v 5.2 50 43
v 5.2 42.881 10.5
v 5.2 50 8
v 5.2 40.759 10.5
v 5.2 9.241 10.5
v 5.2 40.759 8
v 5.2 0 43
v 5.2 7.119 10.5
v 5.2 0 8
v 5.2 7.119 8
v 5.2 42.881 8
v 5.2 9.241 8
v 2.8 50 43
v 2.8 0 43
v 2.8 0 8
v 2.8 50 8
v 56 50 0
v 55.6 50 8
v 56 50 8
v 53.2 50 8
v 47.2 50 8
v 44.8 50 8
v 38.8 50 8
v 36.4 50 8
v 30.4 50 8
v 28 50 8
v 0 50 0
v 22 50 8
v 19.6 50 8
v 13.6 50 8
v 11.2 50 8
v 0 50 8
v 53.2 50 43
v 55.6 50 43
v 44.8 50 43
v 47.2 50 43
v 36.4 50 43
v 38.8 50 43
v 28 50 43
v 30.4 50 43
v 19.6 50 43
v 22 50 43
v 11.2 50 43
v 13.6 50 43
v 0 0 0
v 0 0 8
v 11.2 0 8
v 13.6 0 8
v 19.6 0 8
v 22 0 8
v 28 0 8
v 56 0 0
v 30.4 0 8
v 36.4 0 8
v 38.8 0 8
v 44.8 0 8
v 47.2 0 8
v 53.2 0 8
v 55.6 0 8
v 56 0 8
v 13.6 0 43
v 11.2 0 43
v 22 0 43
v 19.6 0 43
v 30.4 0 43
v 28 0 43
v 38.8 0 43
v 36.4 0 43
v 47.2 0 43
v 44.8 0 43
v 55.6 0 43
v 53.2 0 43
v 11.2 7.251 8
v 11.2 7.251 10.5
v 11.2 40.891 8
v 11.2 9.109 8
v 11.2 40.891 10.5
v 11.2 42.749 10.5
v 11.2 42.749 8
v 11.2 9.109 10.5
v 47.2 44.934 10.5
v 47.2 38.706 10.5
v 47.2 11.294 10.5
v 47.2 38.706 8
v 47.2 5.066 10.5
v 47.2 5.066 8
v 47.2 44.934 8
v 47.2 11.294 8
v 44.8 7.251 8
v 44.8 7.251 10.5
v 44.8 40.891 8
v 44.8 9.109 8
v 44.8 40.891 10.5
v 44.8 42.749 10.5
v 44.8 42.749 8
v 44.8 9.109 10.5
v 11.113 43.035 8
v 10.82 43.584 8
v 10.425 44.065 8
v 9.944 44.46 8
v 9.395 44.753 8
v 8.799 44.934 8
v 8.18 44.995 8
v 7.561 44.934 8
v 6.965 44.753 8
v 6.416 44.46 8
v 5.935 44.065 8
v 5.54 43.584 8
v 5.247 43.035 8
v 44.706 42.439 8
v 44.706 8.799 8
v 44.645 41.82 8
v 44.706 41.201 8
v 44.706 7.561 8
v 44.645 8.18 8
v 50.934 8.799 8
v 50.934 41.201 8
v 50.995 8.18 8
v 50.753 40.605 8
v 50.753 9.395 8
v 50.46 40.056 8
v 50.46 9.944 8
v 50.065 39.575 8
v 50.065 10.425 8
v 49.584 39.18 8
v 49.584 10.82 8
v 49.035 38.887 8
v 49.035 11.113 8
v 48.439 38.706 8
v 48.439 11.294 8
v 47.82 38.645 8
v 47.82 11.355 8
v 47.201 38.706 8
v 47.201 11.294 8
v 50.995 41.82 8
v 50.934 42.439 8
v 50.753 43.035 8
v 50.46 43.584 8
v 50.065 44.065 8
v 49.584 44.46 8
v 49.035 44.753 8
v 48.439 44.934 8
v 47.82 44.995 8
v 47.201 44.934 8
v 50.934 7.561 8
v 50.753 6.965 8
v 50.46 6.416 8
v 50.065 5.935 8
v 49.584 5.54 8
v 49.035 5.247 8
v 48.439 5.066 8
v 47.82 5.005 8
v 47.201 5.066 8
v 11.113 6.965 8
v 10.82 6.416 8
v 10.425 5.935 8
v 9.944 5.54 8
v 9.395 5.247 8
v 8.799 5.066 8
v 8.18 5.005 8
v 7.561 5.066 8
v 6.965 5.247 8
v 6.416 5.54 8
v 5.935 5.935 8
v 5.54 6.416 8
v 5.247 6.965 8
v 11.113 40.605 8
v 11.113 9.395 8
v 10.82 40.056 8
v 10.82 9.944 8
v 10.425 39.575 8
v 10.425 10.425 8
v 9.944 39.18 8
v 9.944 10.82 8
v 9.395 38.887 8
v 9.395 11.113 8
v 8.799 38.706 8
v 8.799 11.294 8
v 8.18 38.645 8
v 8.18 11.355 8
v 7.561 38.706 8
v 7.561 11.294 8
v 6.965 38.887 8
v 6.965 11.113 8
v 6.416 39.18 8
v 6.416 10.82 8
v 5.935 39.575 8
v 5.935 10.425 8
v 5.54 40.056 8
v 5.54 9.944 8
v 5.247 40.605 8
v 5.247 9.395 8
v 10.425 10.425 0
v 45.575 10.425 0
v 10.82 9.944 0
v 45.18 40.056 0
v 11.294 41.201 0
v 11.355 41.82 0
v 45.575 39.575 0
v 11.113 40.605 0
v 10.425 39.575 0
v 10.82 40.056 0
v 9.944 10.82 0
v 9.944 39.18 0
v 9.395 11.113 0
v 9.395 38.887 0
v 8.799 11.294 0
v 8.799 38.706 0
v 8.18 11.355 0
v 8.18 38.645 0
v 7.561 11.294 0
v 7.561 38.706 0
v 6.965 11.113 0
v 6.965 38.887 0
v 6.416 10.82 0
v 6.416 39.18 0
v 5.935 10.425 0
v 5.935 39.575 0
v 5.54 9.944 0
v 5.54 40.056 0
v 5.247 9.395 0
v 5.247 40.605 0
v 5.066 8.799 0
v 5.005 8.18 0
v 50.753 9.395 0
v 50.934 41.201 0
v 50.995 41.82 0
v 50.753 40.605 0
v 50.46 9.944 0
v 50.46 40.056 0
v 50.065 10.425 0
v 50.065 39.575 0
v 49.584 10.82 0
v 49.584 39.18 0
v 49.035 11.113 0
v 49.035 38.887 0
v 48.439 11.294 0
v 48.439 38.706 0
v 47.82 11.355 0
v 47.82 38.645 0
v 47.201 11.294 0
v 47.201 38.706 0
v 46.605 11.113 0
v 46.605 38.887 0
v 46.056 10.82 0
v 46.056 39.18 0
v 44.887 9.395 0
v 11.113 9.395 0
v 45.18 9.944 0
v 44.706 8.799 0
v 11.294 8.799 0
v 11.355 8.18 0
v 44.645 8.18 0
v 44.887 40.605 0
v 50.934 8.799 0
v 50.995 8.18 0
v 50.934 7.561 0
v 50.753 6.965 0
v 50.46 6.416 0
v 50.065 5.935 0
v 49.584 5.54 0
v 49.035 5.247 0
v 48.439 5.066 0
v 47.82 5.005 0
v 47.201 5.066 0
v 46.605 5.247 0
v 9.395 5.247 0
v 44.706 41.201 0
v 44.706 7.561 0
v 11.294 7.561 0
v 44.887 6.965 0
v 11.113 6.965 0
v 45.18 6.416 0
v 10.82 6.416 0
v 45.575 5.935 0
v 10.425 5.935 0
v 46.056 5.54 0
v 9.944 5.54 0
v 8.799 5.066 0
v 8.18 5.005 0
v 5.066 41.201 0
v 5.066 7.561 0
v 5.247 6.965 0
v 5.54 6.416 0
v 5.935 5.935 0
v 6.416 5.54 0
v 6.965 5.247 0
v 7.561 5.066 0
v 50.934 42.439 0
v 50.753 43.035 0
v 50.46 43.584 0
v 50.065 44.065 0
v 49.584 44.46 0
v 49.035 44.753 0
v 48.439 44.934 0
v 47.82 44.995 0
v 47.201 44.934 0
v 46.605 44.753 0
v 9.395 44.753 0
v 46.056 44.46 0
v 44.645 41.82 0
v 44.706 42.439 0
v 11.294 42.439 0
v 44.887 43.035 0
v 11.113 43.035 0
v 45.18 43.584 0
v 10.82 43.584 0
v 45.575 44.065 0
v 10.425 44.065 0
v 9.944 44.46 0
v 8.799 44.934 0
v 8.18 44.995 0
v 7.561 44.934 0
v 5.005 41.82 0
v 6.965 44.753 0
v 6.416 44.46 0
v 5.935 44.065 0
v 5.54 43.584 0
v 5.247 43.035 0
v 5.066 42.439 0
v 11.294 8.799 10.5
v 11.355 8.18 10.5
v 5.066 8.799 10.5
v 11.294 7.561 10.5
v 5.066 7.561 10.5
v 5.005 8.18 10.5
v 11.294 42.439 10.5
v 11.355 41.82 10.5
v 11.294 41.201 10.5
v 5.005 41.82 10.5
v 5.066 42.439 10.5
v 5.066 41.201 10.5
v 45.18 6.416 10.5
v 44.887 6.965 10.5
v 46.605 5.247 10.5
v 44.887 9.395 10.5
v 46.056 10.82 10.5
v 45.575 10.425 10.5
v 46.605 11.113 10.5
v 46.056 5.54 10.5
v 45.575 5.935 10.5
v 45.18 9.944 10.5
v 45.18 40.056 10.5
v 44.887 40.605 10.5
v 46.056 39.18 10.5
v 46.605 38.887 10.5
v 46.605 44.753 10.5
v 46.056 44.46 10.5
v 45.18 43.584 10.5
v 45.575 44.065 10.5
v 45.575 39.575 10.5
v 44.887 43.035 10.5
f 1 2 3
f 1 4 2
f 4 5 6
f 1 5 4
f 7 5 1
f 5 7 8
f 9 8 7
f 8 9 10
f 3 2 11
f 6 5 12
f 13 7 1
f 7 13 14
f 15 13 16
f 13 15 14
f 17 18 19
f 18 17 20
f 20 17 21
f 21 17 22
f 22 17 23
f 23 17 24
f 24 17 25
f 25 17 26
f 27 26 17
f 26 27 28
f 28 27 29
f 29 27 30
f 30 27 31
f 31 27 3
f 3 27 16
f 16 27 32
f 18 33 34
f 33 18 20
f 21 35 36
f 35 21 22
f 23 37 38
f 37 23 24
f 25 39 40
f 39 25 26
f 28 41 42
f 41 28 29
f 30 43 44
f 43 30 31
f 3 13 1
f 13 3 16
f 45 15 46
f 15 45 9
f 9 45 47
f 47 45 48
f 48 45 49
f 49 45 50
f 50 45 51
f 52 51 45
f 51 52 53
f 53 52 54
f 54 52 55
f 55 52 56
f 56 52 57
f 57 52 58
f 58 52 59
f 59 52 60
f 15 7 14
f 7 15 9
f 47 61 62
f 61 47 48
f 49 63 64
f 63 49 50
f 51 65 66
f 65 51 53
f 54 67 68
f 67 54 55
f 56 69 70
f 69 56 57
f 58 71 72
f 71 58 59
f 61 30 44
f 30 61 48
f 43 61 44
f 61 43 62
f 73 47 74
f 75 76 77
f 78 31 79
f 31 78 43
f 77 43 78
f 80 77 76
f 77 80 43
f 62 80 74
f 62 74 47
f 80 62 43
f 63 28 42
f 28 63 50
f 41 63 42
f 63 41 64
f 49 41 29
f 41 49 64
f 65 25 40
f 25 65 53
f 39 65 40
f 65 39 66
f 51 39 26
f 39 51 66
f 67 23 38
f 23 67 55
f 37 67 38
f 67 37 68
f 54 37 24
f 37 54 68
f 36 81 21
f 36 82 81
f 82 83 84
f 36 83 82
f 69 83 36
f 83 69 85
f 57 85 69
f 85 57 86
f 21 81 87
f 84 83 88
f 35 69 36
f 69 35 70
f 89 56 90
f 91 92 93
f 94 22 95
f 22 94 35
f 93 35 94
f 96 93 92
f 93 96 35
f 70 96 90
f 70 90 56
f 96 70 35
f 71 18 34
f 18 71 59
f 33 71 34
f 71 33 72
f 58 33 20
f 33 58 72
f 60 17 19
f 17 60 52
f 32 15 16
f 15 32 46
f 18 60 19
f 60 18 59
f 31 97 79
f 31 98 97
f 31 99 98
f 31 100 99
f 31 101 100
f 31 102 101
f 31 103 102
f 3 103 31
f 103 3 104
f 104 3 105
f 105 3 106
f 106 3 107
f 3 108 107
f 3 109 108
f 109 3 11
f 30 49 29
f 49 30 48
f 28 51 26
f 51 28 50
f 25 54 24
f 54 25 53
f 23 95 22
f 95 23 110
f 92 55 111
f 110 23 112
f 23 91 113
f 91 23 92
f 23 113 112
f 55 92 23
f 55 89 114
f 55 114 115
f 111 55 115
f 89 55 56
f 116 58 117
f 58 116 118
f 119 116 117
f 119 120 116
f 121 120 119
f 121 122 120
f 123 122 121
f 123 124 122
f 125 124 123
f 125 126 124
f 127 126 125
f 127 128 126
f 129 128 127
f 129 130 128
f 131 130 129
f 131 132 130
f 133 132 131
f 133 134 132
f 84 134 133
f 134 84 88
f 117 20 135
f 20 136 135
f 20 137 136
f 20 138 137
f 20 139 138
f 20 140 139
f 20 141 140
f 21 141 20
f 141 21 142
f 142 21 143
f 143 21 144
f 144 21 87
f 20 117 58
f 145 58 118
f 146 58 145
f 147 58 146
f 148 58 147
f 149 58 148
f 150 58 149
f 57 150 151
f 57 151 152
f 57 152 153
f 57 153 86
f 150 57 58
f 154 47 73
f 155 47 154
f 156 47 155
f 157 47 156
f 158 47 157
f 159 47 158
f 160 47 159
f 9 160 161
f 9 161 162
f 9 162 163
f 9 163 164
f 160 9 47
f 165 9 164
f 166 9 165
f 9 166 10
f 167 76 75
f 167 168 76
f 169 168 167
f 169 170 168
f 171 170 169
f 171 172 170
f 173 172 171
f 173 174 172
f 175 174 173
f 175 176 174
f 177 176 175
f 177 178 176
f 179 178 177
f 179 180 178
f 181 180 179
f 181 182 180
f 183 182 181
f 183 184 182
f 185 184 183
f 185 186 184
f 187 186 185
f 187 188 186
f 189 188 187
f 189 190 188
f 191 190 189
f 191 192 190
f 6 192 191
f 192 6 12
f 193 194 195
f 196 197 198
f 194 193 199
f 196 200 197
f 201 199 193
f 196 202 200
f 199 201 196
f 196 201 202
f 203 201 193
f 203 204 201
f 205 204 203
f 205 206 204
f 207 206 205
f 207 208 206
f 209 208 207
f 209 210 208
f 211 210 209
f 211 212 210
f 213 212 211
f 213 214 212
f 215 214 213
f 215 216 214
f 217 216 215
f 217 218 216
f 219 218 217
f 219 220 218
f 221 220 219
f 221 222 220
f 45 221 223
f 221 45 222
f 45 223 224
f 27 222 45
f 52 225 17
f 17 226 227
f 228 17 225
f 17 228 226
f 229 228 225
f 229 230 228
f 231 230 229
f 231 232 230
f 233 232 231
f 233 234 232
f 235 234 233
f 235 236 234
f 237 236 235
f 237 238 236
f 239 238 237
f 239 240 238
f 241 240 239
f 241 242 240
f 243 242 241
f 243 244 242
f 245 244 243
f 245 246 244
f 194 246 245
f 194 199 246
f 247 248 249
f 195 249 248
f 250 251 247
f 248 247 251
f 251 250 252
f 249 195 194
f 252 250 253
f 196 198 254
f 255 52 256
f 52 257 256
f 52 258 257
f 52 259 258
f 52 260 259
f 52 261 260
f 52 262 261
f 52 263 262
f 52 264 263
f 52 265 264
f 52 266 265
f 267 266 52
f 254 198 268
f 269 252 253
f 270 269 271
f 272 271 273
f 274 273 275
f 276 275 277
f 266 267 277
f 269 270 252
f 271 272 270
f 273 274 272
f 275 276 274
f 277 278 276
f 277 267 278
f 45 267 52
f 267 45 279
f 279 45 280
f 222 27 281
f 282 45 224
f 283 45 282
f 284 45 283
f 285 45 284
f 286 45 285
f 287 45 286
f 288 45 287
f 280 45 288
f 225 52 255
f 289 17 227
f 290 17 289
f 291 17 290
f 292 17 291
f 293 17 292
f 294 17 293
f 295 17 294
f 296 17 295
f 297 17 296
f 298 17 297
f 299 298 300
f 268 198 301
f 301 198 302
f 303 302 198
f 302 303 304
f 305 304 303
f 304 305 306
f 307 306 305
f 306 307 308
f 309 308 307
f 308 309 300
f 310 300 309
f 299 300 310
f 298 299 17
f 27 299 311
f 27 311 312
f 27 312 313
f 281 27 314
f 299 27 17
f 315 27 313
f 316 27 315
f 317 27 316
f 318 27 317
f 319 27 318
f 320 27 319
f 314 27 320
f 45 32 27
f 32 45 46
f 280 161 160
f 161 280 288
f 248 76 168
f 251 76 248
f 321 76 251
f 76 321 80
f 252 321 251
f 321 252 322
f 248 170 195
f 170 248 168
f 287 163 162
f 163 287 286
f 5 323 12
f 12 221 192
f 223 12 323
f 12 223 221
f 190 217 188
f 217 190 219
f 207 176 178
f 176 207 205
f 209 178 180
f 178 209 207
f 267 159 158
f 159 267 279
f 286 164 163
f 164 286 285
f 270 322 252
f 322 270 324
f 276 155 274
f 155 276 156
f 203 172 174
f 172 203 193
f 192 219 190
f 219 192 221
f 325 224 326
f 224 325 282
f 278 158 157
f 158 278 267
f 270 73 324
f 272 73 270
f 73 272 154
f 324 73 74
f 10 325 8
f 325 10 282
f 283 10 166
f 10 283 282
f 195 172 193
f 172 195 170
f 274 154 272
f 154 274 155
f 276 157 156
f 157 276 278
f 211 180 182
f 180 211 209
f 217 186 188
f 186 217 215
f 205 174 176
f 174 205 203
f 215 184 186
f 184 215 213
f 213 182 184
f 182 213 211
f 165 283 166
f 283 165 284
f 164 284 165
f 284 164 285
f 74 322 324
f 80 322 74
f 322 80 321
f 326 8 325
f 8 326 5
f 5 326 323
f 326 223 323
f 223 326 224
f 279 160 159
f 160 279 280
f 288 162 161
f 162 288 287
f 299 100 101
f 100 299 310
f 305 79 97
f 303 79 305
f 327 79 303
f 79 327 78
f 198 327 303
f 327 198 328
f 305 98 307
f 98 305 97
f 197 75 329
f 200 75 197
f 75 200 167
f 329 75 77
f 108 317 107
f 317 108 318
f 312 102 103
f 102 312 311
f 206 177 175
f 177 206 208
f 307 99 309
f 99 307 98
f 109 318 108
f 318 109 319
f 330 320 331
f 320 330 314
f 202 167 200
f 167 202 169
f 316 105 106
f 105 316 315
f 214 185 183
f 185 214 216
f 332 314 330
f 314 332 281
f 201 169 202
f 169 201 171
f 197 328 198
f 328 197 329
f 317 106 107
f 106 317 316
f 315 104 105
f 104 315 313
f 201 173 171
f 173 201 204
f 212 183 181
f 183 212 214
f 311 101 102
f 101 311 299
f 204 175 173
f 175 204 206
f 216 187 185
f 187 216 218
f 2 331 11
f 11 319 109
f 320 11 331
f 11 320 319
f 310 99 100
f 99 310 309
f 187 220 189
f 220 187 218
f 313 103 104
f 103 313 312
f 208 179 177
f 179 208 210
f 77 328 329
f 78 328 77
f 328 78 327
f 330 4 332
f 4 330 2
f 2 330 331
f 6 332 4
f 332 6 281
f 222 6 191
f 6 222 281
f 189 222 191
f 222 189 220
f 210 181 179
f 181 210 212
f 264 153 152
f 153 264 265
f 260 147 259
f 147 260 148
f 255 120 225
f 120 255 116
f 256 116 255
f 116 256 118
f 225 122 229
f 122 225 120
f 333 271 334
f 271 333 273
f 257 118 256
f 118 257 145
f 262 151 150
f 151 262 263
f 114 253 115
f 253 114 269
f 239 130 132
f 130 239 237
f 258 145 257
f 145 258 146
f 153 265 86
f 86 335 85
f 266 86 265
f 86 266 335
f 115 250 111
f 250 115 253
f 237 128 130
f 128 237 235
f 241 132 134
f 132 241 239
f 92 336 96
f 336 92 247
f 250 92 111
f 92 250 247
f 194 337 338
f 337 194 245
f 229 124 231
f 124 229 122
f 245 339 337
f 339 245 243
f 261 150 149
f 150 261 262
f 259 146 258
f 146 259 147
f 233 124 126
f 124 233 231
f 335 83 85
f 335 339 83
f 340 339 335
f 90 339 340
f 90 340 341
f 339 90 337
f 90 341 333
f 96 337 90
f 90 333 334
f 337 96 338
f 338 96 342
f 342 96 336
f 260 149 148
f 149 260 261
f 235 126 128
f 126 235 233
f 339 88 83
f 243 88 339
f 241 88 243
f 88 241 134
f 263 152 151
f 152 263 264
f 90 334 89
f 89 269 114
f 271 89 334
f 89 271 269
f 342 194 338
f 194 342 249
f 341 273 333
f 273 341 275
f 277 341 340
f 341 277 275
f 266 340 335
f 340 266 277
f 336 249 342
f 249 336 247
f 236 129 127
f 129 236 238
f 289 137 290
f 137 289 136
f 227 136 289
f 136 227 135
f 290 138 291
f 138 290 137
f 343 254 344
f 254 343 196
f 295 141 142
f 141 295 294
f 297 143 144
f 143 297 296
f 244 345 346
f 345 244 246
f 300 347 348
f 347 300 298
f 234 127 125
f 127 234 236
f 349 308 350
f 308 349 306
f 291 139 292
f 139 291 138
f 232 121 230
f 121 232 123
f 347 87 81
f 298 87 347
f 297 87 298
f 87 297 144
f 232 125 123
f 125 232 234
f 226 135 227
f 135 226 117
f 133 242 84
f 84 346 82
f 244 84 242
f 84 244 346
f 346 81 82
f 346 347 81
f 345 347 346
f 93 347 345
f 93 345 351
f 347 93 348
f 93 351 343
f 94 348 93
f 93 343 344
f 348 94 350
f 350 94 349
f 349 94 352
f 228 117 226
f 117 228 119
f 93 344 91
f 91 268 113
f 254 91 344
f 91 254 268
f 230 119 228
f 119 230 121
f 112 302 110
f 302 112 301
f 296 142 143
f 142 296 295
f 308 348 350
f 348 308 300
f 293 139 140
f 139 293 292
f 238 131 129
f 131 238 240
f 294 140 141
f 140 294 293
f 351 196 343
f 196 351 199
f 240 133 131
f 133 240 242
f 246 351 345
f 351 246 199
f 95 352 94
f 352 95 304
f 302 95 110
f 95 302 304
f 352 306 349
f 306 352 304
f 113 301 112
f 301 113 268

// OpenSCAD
$fn = 32;

// ----------------------------------------------------------------------
// Finned heat sink: 56 x 50 mm base, 35 mm fins
// ----------------------------------------------------------------------

// --- parameters (mm) ---
base_w = 56;              // base width
base_d = 50;              // base depth
base_t = 8;               // base thickness
fin_h = 35;               // fin height above the base
holes_d = 6.35;           // fixing holes
hole_x = 19.82;           // hole offset in x
hole_y = 16.82;           // hole offset in y
fin_t = 2.4;              // fin thickness
fin_pitch = 8.4;          // fin pitch
fin_count = 7;            // number of fins
fin_x0 = 2.8;             // first fin offset

difference() {
  union() {
    cube([base_w, base_d, base_t]);
    for (i = [0 : fin_count - 1]) {
      translate([fin_x0 + i * fin_pitch, 0, base_t - 0.5]) cube([fin_t, base_d, fin_h + 0.5]);
    }
  }
  /* fixing holes through the base, 2.5 mm clear on both sides */
  for (hx = [-19.82, 19.82]) {
    for (hy = [-16.82, 16.82]) {
      translate([base_w / 2 + hx, base_d / 2 + hy, -2.5]) cylinder(h = base_t + 5, d = holes_d);
    }
  }
}
